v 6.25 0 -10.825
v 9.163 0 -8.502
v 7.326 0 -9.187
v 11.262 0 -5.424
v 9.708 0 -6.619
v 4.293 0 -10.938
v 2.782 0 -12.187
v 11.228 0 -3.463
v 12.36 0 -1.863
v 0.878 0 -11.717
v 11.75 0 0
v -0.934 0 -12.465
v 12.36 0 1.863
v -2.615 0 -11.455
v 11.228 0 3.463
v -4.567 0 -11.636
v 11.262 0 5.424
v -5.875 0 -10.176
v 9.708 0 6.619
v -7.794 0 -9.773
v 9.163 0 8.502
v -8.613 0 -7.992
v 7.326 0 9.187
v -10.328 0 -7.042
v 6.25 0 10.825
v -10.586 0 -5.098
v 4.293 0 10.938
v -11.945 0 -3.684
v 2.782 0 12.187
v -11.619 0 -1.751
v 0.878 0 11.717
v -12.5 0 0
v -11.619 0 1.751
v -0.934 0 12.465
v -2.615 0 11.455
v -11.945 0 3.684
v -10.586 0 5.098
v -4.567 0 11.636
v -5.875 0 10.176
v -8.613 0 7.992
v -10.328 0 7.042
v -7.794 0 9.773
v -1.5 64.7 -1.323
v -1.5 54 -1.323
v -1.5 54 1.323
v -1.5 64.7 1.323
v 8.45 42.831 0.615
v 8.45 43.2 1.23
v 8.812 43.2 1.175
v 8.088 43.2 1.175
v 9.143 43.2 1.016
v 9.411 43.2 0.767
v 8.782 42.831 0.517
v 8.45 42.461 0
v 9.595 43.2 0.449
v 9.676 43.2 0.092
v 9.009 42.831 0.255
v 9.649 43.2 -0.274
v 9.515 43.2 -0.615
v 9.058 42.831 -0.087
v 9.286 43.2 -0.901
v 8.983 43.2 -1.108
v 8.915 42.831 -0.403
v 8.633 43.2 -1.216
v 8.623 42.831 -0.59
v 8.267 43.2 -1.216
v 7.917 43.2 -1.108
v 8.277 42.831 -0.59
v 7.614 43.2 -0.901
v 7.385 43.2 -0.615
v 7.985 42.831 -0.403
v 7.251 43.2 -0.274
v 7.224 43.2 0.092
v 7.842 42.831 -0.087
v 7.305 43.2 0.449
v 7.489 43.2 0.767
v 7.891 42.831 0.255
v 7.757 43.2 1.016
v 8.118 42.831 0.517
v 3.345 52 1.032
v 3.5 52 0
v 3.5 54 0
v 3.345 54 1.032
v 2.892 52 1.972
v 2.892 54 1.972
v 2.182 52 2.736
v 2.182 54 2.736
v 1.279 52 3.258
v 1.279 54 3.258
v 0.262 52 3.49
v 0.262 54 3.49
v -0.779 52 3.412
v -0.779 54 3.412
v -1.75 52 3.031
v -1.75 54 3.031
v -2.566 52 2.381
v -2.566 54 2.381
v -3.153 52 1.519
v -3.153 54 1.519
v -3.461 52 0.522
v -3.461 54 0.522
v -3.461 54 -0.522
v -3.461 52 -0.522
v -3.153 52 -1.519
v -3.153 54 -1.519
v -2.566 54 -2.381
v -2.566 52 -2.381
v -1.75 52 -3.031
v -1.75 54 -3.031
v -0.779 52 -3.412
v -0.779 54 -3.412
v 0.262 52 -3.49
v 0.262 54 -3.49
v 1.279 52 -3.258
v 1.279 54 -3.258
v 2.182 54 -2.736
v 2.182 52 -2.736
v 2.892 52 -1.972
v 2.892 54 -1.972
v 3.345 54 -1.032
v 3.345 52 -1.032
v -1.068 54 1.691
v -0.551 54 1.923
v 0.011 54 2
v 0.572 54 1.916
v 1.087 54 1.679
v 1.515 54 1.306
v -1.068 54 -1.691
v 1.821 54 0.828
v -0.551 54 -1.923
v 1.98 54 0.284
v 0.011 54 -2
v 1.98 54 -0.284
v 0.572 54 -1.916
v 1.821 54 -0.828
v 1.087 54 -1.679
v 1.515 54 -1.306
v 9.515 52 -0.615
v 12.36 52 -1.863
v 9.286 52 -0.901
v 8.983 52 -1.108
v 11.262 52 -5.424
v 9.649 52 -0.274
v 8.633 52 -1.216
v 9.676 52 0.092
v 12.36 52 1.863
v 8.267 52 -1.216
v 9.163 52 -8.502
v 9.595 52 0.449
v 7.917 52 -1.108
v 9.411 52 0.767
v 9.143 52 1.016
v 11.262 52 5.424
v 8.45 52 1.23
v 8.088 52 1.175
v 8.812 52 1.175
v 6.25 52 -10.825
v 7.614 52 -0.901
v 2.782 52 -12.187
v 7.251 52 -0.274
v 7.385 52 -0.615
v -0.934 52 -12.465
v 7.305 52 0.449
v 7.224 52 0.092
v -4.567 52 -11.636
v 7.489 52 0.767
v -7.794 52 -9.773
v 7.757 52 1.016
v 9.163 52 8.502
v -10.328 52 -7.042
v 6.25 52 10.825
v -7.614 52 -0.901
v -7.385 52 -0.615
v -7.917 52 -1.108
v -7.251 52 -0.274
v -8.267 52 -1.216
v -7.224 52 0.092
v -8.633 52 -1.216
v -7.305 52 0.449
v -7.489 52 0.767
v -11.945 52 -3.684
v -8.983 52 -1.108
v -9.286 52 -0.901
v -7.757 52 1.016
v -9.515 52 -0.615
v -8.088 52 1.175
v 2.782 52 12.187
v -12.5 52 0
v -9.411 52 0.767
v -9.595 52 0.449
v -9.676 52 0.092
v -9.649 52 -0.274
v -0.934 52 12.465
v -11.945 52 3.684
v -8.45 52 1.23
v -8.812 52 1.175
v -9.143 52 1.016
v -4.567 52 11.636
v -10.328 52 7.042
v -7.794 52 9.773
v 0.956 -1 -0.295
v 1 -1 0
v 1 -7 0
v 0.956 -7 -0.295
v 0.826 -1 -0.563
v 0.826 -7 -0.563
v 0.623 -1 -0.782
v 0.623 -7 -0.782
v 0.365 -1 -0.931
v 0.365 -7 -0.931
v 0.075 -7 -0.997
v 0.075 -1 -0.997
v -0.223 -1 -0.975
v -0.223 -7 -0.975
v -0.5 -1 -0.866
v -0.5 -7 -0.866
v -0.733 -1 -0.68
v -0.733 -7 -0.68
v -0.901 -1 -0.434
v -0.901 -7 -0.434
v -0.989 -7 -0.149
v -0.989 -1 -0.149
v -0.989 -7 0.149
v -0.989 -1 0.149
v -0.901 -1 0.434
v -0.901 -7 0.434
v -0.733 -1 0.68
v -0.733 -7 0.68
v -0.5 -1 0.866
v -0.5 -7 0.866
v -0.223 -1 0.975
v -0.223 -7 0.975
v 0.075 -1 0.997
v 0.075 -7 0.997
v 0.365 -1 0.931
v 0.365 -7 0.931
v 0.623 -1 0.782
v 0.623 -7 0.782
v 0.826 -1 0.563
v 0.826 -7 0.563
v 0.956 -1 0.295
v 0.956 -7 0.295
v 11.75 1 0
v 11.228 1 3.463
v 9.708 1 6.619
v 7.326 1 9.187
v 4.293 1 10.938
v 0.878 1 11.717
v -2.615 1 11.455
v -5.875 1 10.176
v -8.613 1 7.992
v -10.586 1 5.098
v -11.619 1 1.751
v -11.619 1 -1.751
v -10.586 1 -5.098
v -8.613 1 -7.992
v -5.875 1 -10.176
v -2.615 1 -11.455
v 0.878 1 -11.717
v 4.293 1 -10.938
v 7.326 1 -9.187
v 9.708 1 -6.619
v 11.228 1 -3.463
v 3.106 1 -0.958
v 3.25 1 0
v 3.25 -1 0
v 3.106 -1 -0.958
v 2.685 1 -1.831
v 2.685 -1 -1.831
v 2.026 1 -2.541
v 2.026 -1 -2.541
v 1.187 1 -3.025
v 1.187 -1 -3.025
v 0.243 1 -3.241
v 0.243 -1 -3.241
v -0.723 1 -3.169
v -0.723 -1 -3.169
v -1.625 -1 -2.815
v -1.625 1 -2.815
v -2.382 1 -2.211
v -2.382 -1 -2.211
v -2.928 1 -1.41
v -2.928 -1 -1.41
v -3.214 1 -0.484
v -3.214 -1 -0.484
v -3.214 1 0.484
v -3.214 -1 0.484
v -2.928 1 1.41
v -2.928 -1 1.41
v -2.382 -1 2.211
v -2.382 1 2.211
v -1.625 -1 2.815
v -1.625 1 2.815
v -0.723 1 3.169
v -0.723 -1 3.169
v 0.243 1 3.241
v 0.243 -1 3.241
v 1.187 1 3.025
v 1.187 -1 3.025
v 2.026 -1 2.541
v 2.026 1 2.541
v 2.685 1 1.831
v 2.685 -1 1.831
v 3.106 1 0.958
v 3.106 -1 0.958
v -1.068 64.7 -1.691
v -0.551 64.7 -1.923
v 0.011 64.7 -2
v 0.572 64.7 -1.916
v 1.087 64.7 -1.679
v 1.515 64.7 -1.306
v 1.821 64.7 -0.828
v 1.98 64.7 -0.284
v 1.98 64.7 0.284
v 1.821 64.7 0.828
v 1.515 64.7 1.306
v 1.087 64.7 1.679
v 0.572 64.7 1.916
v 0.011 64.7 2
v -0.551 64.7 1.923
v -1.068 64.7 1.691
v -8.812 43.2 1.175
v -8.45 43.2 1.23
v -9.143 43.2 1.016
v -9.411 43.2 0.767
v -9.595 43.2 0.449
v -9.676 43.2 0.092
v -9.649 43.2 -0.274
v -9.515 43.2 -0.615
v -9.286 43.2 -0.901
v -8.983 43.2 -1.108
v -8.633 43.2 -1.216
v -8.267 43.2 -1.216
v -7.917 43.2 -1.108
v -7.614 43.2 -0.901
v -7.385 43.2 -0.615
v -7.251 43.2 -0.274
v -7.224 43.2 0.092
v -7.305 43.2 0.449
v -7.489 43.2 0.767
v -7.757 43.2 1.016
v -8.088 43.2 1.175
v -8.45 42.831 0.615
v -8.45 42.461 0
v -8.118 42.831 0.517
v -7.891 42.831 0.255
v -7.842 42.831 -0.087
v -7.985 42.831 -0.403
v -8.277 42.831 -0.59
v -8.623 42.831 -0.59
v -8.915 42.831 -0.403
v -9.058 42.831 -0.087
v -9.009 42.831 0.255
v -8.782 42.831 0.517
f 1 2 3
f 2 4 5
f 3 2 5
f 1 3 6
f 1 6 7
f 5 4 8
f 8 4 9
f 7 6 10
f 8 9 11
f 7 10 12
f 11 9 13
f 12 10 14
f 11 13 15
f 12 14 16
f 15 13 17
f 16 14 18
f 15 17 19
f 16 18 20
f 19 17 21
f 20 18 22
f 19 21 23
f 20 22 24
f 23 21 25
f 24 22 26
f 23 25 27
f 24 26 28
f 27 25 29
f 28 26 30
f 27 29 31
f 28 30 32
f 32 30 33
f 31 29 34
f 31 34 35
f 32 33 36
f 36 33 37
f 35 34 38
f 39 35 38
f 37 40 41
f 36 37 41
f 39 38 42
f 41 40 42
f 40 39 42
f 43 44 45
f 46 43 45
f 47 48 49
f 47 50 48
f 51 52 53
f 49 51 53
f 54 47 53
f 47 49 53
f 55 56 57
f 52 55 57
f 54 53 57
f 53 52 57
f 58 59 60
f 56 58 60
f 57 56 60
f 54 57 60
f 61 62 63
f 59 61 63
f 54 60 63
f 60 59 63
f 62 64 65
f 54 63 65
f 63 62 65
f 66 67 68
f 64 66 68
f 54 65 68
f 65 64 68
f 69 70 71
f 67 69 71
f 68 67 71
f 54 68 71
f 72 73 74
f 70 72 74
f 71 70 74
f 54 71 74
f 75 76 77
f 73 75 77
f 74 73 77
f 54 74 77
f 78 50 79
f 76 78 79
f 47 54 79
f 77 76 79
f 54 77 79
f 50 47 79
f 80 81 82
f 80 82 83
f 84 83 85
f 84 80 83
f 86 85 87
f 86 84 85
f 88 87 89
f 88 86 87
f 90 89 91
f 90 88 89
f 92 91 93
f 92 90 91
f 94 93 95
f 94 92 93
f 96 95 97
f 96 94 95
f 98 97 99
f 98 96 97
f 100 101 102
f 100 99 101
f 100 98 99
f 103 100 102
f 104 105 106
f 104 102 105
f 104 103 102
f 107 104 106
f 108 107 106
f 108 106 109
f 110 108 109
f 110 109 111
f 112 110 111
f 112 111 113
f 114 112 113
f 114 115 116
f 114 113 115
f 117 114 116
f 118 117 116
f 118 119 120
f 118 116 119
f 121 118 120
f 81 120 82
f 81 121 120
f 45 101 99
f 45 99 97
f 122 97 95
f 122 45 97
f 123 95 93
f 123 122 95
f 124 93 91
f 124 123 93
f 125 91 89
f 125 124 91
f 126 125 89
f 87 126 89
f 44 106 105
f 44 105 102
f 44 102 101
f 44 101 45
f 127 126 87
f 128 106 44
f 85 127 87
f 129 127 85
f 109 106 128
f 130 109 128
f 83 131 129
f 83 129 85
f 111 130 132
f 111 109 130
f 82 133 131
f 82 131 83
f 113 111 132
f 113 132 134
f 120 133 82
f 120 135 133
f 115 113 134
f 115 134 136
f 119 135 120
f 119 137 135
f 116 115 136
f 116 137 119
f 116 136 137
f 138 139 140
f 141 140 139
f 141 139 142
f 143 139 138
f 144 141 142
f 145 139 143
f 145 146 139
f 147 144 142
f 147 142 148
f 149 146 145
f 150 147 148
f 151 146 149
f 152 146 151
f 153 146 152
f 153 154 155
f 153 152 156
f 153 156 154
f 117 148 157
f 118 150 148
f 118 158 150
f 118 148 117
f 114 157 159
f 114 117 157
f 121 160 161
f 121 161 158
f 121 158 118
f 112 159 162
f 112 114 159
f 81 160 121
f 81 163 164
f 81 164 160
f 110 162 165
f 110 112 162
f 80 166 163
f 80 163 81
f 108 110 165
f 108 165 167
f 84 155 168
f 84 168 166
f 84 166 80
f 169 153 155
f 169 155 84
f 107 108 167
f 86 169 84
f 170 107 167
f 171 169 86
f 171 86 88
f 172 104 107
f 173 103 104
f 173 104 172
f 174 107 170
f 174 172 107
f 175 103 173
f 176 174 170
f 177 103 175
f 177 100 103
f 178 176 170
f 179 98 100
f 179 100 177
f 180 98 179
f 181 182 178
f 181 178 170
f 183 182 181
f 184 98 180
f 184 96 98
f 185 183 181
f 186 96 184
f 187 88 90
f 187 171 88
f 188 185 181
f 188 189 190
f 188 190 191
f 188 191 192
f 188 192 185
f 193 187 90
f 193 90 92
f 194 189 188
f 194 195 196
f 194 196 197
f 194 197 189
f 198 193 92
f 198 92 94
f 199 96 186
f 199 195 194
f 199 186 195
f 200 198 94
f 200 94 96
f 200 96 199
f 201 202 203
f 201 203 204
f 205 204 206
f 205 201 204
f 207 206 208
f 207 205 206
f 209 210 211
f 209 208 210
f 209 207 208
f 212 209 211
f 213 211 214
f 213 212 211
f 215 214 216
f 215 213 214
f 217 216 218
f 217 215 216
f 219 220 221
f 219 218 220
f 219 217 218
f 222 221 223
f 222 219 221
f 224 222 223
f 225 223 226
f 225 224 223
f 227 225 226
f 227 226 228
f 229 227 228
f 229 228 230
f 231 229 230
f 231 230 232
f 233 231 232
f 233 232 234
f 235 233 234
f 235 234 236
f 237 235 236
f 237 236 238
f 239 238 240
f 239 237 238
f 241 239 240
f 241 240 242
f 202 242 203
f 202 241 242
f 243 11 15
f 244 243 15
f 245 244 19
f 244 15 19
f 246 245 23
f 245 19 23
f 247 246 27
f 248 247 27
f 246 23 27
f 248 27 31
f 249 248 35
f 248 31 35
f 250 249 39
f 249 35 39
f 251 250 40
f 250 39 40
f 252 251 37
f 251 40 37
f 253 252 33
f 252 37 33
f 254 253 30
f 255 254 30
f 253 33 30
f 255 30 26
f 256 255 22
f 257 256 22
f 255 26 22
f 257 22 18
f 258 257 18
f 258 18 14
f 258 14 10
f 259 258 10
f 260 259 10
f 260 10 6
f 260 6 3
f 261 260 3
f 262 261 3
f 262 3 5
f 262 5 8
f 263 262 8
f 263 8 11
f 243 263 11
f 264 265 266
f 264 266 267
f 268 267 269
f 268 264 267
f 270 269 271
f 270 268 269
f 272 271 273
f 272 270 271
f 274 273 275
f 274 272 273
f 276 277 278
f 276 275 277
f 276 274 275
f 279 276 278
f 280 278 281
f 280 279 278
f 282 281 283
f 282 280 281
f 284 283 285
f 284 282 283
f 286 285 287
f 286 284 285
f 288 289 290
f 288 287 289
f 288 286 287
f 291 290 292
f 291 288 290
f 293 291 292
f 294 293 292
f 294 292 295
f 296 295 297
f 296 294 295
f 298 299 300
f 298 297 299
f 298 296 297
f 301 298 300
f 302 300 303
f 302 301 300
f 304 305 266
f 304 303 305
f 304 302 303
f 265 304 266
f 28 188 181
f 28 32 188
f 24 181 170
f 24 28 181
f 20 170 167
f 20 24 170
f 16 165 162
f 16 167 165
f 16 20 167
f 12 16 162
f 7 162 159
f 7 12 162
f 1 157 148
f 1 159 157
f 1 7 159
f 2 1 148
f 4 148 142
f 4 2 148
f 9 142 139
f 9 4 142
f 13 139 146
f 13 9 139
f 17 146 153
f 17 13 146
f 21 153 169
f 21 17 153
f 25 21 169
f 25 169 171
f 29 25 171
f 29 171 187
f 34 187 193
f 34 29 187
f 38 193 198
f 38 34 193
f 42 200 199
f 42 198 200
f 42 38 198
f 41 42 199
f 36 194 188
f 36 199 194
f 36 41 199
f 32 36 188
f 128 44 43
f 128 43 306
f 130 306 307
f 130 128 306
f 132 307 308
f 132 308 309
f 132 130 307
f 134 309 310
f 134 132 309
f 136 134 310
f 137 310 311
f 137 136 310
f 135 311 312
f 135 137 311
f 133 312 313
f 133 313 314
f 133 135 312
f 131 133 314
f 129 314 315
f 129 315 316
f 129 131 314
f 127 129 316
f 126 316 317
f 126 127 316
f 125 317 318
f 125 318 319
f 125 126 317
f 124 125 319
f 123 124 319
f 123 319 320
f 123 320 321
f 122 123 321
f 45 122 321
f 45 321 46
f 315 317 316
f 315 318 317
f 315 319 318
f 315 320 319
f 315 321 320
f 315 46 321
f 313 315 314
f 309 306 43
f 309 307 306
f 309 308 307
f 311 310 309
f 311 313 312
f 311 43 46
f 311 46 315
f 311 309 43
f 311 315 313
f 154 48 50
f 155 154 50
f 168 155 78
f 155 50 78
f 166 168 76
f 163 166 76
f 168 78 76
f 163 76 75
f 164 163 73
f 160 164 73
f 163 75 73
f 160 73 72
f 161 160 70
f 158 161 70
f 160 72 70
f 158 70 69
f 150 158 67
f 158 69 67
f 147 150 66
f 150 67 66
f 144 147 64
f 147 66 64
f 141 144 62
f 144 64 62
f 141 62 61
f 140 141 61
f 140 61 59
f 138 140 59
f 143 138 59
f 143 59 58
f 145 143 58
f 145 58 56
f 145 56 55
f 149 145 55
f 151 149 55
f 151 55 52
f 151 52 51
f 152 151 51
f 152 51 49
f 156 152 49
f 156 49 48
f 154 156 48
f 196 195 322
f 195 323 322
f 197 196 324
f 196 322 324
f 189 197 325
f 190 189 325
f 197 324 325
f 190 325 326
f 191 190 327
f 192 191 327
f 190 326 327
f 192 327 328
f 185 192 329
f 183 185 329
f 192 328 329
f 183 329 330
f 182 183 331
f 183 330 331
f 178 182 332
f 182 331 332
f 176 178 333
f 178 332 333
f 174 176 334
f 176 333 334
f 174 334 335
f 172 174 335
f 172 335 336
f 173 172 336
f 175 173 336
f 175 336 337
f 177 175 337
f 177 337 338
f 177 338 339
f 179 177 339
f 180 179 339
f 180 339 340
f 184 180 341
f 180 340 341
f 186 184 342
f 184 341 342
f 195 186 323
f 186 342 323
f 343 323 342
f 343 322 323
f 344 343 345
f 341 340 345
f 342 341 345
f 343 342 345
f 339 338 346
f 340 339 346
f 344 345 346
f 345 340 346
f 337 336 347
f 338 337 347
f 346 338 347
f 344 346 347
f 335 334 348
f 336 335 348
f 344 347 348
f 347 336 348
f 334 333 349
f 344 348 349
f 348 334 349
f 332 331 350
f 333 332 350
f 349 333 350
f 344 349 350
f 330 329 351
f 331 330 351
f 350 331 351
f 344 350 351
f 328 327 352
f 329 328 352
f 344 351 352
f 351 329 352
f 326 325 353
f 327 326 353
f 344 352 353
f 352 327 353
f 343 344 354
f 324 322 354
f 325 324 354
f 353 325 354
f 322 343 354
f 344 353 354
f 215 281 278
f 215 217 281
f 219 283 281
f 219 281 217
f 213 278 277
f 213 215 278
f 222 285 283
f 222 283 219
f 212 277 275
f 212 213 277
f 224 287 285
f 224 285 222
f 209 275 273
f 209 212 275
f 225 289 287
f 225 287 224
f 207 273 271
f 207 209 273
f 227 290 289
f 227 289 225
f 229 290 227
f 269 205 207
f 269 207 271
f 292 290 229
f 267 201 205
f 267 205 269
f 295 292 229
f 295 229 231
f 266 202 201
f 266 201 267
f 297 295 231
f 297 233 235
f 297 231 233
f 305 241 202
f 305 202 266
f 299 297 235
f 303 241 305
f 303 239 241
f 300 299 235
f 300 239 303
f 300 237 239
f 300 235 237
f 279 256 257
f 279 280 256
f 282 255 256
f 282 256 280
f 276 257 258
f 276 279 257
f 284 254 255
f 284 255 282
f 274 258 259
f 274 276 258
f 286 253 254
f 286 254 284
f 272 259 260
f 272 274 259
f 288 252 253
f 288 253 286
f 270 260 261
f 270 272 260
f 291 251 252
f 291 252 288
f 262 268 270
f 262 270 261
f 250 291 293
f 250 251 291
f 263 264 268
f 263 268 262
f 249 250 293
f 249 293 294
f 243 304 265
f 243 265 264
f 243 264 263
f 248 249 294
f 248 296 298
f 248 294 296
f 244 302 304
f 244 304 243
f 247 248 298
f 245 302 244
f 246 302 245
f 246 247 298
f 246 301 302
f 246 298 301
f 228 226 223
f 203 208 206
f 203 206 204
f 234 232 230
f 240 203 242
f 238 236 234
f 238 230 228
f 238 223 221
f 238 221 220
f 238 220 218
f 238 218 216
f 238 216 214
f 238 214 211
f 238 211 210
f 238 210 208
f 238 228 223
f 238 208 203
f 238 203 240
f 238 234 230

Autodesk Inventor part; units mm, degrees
ref_plane "YZ Plane" through (0, 0, 0) normal (1, 0, 0) x (0, 1, 0)
ref_plane "XZ Plane" through (0, 0, 0) normal (0, 1, 0) x (-1, 0, 0)
ref_plane "XY Plane" through (0, 0, 0) normal (0, 0, 1) x (1, 0, 0)
sketch "Sketch1" plane through (0, 0, 0) normal (0, 1, 0) x (-1, 0, 0)
  circle A0 centre (0, 0) radius 12.5
  dimension "d0" = 25
extrude "Extrusion1" add sketch "Sketch1" along normal blind 52
sketch "Sketch2" plane through (0, 52, 0) normal (0, 1, 0) x (1, 0, 0)
  circle A0 centre (0, 0) radius 3.5
  dimension "d3" = 7
extrude "Extrusion2" add sketch "Sketch2" along normal blind 2
sketch "Sketch3" plane through (0, 54, 0) normal (0, 1, 0) x (1, 0, 0)
  circle A0 centre (0, 0) radius 2
  line L0 (-1.5, -2) -> (2, -2)
  line L1 (2, -2) -> (2, 2)
  line L2 (2, 2) -> (-1.5, 2)
  line L3 (-1.5, 2) -> (-1.5, -2)
  point P0 (-1.5, 1.3229)
  point P1 (-1.5, -1.3229)
  dimension "d6" = 4
  dimension "d7" = 3.5
extrude "Extrusion3" add sketch "Sketch3" along normal blind 10.7 contours A0 L3 picked at (0.1351, 0.5212)
sketch "Sketch4" plane through (0, 0, 0) normal (0, -1, 0) x (1, 0, 0)
  circle A0 centre (0, 0) radius 11.75
  dimension "d10" = 23.5
extrude "Extrusion4" cut sketch "Sketch4" against normal blind 1
sketch "Sketch5" plane through (0, 1, 0) normal (0, -1, 0) x (1, 0, 0)
  circle A0 centre (0, 0) radius 12.5 projected
  circle A1 centre (0, 0) radius 3.25
  dimension "d13" = 6.5
extrude "Extrusion5" add sketch "Sketch5" along normal blind 2 contours A1
sketch "Sketch6" plane through (0, -1, 0) normal (0, -1, 0) x (1, 0, 0)
  circle A0 centre (0, 0) radius 1
  dimension "d16" = 2
extrude "Extrusion6" add sketch "Sketch6" along normal blind 6
sketch "Sketch7" plane through (0, 52, 0) normal (0, 1, 0) x (1, 0, 0)
  line L0 (0, 17.5) -> (0, -17.5) projected
  point P0 (0, 0)
  point P1 (-8.45, 0)
  point P2 (8.45, 0)
  dimension "d19" = 16.9
hole "Hole1" at (-8.45, 52, 0) at (8.45, 52, 0) direction (0, -1, 0) diameter 2.459 depth 8.8 tip angle 118 thread size "M3x0.5" class "6H" standard "ANSI Metric M Profile"
properties part number "Motor12V_V1" material "Steel"
